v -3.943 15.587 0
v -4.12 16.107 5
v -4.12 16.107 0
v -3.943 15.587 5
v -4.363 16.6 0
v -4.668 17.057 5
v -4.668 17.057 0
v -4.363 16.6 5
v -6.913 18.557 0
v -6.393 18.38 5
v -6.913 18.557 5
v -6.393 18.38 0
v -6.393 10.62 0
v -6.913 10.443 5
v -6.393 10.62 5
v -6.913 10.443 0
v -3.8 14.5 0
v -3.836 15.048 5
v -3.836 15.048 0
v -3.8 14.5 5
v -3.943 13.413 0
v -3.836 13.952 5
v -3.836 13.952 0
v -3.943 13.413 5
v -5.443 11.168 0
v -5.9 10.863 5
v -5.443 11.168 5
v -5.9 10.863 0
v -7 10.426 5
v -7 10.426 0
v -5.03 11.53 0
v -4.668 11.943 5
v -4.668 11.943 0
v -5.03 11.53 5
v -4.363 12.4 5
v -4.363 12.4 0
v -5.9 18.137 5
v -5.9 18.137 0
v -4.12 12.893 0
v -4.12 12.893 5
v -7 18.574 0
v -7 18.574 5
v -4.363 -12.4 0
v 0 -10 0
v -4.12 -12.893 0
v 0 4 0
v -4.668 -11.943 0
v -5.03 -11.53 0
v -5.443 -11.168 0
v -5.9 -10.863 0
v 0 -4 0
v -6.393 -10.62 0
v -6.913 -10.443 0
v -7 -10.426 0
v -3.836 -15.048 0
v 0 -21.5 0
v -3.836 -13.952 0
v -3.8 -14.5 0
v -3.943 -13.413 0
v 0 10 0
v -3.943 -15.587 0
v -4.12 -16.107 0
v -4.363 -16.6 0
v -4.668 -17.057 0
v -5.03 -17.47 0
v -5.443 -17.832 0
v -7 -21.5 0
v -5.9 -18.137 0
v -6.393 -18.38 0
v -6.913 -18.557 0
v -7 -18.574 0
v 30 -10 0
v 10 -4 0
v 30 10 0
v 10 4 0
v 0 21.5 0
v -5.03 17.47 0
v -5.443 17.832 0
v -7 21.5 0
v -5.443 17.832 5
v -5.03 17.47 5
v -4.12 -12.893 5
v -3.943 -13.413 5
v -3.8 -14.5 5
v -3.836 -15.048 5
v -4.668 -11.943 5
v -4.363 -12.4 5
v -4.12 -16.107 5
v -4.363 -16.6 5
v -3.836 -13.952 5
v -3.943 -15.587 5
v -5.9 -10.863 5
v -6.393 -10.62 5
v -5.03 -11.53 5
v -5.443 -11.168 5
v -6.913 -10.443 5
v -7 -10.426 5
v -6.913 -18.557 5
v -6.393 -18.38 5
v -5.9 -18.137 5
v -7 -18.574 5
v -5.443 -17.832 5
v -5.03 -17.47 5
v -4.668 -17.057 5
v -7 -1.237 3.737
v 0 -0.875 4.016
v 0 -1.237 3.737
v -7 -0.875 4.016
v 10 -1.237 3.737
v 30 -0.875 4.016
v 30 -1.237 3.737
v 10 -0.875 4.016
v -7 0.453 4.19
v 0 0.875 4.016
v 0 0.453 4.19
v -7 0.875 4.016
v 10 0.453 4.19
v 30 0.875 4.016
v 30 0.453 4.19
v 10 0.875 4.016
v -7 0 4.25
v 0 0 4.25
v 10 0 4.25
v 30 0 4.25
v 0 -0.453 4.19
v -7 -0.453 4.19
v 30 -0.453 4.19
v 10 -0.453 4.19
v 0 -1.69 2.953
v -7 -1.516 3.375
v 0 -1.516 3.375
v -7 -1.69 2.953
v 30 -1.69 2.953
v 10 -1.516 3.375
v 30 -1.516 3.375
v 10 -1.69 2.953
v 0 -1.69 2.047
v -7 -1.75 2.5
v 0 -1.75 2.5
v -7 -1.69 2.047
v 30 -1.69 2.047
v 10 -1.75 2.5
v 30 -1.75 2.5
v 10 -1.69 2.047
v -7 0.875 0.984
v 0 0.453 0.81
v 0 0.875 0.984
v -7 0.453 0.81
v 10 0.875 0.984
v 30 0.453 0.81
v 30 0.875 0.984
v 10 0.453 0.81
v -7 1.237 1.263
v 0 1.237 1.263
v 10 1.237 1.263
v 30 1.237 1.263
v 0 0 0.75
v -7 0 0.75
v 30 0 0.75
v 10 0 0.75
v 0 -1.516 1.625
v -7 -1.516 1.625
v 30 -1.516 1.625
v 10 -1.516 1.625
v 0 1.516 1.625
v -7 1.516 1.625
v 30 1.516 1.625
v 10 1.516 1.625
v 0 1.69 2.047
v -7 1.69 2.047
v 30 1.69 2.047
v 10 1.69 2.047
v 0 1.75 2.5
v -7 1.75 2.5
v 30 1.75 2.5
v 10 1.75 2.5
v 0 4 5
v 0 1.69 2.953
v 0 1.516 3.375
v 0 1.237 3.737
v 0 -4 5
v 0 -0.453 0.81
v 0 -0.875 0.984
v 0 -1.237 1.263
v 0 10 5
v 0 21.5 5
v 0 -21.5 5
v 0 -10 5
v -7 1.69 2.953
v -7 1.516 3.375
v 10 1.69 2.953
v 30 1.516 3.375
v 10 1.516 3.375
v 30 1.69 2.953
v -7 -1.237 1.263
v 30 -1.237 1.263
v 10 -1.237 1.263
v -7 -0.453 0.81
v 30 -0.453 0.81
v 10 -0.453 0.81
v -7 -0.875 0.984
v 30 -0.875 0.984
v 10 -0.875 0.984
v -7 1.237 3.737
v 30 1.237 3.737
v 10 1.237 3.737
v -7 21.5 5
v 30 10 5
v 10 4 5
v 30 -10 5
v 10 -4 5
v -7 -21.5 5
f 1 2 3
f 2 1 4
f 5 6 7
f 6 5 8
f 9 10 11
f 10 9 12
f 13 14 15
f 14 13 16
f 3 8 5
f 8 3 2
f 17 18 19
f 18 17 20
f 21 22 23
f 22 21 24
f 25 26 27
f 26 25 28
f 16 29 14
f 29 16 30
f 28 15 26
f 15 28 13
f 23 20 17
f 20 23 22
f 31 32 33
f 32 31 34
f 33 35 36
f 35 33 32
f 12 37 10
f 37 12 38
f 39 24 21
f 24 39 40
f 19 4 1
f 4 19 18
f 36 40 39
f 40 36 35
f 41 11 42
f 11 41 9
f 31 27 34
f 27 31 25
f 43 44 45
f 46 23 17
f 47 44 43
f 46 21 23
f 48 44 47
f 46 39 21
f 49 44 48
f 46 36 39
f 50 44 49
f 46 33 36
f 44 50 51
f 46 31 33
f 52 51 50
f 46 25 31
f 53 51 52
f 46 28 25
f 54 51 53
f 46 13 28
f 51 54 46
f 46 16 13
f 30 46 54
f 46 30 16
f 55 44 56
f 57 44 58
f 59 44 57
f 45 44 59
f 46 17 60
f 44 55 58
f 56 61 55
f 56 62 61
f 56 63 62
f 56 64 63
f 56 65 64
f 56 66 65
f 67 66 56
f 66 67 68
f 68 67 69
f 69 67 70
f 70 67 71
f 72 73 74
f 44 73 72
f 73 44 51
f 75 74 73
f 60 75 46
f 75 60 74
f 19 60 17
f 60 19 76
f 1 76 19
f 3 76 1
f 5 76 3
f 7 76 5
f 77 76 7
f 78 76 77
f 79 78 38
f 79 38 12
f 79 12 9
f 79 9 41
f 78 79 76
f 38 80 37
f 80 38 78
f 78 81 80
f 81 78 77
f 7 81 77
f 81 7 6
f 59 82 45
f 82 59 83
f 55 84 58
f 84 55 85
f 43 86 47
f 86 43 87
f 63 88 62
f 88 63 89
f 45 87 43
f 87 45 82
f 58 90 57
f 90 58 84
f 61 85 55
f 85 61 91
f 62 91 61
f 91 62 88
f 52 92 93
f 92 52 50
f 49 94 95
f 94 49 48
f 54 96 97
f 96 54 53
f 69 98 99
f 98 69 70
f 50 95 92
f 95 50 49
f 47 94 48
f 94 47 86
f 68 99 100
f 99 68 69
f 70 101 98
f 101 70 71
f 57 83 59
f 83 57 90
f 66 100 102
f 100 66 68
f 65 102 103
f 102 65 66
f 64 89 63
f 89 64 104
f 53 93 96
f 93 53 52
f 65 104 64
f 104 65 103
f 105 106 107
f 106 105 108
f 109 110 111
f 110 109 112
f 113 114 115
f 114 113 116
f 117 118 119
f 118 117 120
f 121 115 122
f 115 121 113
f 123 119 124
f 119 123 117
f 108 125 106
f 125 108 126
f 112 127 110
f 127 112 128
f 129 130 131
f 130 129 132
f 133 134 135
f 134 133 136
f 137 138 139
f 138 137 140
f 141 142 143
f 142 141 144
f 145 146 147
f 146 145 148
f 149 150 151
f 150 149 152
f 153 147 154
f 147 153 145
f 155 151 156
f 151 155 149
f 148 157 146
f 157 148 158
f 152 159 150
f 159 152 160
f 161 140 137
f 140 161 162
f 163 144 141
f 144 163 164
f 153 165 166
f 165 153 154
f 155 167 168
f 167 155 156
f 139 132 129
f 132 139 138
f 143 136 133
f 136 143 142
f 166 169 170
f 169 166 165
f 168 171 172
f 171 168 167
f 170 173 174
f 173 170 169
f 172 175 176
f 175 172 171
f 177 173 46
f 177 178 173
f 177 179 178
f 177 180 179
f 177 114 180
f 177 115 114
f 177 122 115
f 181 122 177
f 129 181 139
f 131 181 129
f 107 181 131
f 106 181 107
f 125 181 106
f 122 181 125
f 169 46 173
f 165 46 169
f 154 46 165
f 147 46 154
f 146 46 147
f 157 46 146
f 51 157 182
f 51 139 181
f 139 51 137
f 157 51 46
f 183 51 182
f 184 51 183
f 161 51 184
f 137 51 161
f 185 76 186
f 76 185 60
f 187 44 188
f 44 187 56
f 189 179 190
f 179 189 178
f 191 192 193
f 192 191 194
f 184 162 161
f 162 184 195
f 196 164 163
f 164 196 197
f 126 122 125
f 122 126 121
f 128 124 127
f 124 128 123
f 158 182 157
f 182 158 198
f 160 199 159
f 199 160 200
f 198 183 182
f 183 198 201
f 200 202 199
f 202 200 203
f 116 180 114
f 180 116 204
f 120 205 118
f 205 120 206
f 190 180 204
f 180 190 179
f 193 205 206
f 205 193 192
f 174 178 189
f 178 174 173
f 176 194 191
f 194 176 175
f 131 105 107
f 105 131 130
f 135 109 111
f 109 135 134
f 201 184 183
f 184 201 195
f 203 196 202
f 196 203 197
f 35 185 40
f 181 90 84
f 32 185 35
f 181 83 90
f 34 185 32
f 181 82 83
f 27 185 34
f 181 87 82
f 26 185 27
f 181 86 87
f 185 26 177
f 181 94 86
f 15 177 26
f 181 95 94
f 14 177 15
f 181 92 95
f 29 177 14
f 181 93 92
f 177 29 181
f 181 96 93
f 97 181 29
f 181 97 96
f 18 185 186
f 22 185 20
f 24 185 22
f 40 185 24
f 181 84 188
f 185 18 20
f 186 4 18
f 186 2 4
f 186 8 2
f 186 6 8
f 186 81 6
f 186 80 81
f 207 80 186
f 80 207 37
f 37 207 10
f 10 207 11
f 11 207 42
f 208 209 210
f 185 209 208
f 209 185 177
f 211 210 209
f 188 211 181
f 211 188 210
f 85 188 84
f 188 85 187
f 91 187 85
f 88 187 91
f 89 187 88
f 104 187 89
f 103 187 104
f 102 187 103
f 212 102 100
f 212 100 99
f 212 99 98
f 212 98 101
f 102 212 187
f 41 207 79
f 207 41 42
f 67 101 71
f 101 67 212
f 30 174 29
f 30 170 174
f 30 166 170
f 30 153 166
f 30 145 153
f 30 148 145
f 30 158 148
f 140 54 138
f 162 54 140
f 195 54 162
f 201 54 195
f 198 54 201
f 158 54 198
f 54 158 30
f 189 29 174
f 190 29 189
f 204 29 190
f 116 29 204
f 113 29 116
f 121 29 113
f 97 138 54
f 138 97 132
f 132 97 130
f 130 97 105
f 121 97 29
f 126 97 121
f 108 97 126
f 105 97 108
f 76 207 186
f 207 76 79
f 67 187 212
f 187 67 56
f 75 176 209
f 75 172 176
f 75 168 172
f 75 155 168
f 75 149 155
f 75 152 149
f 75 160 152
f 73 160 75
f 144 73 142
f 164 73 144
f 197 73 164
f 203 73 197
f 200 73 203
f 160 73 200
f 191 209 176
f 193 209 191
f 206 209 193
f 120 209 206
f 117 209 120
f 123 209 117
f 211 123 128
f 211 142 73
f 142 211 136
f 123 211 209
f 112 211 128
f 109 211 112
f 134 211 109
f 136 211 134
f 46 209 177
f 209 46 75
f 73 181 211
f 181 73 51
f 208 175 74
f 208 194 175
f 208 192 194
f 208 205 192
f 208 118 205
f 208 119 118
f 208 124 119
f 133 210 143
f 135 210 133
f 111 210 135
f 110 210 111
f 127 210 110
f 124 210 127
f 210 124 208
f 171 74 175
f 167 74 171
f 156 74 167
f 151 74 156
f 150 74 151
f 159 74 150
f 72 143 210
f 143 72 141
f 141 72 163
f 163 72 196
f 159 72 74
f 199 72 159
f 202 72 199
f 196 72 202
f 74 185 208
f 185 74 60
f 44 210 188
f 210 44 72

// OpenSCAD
rotate([0,270,0])
difference()
{
    union()
    {
        translate([0,-(29+4*2+3*2)/2,0])
            cube([5,29+4*2+3*2,3+4]);
    }
    union()
    {
        translate([0,29/2,4+4])
            rotate([0,90,0])
                cylinder(d=8.4,h=6,$fn=48);
        
        translate([0,-29/2,4+4])
            rotate([0,90,0])
                cylinder(d=8.4,h=6,$fn=48);
        
        translate([5/2,0,0])
            cylinder(d=3.5,h=10,$fn=24);
    }
}

difference()
{
    union()
    {
        translate([-1,-10,0])
            cube([30+1,20,5]);
    }
    union()
    {
        translate([0,-4,0])
            cube([10,8,5]);
        
        translate([-2,0,5/2])
            rotate([0,90,0])
                cylinder(d=3.5,h=40,$fn=24);
    }
}
